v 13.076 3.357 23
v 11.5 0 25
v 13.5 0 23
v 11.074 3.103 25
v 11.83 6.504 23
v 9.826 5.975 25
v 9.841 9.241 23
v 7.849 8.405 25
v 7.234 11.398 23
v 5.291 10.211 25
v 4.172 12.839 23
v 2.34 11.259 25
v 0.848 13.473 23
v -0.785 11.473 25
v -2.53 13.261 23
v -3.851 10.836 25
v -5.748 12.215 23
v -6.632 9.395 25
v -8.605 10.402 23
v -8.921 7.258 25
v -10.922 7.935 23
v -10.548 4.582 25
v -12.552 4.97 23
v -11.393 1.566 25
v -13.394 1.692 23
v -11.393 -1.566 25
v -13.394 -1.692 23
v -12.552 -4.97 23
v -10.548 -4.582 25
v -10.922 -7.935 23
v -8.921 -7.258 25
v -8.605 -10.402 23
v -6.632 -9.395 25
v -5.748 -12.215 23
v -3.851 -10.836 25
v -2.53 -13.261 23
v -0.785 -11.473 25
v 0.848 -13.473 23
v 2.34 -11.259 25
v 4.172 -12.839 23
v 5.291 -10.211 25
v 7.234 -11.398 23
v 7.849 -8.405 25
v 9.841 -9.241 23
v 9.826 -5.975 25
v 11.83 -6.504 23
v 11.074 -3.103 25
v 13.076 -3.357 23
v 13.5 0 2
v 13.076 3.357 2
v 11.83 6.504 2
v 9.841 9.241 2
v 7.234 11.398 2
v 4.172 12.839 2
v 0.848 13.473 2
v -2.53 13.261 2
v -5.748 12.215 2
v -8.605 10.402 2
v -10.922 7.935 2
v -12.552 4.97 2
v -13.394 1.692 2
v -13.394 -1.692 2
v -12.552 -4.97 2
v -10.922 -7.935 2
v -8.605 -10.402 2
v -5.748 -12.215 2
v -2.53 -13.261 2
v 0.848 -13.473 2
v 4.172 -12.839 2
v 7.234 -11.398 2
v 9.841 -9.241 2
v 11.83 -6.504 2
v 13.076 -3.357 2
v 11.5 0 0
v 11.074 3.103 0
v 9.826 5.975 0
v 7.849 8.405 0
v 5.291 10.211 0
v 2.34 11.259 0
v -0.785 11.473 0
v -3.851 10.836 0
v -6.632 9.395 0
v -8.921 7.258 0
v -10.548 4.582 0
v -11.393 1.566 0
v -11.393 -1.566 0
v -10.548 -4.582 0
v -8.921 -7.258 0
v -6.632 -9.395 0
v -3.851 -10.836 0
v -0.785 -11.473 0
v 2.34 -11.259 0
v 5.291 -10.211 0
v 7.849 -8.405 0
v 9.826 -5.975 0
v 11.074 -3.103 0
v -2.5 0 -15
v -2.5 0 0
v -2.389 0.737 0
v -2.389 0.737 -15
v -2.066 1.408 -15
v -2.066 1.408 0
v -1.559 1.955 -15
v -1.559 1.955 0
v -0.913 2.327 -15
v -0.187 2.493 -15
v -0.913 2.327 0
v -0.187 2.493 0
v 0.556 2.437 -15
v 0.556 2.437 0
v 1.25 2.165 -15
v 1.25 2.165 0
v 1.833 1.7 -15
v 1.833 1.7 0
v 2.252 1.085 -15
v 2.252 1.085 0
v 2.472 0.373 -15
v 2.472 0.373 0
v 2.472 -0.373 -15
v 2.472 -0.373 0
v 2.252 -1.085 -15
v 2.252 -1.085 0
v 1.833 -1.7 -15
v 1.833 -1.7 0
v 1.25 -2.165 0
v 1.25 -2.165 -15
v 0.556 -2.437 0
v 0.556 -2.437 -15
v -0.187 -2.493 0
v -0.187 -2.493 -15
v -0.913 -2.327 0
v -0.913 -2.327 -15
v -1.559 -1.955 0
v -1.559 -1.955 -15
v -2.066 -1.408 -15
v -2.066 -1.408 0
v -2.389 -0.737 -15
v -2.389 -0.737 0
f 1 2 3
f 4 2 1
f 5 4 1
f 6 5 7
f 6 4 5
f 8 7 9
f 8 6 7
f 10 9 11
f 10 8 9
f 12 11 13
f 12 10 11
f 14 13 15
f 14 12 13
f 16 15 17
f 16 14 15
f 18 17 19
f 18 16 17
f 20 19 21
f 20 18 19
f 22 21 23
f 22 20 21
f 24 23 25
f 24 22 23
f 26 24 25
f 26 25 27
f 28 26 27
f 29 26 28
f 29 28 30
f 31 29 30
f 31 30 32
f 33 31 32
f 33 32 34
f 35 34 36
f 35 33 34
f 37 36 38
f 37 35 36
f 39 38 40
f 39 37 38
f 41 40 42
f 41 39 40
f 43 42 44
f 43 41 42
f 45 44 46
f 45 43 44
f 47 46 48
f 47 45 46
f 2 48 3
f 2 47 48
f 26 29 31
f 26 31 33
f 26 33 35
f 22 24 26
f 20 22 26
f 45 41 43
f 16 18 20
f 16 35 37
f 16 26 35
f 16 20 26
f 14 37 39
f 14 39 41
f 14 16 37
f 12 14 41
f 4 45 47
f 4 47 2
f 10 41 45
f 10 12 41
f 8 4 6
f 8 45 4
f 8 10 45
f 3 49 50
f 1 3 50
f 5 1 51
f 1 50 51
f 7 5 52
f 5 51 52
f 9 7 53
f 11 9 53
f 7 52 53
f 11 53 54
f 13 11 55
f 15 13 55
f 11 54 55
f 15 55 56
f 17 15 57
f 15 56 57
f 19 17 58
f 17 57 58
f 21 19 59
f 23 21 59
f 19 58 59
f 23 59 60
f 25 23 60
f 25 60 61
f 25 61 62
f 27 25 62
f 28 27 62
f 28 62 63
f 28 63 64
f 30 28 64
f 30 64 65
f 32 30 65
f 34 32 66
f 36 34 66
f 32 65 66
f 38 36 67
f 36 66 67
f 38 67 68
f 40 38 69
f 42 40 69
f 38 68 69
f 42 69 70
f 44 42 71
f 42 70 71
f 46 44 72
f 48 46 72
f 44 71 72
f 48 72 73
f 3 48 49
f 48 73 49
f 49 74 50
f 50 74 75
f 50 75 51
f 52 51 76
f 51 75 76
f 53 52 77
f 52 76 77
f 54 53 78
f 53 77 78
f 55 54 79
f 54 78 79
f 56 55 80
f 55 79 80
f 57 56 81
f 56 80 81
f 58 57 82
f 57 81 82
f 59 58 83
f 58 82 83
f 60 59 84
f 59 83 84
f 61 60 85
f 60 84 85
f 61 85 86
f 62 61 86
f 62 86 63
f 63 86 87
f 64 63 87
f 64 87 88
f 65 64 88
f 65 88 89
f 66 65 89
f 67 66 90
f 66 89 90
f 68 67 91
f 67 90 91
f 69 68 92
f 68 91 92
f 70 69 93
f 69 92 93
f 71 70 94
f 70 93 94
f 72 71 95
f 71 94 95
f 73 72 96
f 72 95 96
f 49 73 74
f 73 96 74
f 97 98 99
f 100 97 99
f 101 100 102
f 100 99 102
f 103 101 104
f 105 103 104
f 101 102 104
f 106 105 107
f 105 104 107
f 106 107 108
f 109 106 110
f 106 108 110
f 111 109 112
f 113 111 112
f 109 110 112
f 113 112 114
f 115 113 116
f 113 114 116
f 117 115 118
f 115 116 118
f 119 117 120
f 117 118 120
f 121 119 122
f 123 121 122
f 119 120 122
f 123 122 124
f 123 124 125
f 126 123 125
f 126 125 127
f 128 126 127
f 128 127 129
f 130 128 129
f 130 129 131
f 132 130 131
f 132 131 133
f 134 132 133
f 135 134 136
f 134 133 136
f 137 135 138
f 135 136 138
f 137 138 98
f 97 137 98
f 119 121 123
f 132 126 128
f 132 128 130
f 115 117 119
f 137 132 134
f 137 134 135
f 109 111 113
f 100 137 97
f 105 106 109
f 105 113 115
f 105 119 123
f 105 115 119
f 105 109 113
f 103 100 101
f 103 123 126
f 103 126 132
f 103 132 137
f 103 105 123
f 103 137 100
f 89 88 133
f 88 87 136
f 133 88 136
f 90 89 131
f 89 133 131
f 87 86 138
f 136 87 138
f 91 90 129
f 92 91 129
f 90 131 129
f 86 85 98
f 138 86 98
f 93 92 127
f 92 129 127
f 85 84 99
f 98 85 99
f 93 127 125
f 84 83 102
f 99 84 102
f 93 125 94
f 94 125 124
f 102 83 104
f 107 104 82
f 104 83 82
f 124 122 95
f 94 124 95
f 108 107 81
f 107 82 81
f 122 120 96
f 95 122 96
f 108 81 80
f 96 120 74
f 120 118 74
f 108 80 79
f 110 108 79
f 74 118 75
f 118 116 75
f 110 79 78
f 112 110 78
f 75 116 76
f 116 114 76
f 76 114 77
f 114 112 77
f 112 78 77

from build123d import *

# Parameters (mm, degrees)
SKETCH_1_R      = 13.5
EXTRUDE_1_DEPTH = 25
CHAMFER_1_SIZE  = 2
SKETCH_2_R      = 2.5
EXTRUDE_2_DEPTH = 15


with BuildPart() as part:
    # 스케치1 → 보스-돌출1 (new body)
    with BuildSketch(Plane.XY):
        Circle(SKETCH_1_R)
    extrude(amount=EXTRUDE_1_DEPTH)

    # 모따기1
    chamfer_1_edges = [part.edges().sort_by_distance(p)[0] for p in [
        (-13.5, 0, 0),
        (-13.5, 0, 25),
    ]]
    chamfer(chamfer_1_edges, length=CHAMFER_1_SIZE)

    # 스케치2 → 보스-돌출2 (add)
    with BuildSketch(Plane(origin=(0, 0, 0), x_dir=(-1, 0, 0), z_dir=(0, 0, -1))):
        Circle(SKETCH_2_R)
    extrude(amount=EXTRUDE_2_DEPTH)


solid = part.part
